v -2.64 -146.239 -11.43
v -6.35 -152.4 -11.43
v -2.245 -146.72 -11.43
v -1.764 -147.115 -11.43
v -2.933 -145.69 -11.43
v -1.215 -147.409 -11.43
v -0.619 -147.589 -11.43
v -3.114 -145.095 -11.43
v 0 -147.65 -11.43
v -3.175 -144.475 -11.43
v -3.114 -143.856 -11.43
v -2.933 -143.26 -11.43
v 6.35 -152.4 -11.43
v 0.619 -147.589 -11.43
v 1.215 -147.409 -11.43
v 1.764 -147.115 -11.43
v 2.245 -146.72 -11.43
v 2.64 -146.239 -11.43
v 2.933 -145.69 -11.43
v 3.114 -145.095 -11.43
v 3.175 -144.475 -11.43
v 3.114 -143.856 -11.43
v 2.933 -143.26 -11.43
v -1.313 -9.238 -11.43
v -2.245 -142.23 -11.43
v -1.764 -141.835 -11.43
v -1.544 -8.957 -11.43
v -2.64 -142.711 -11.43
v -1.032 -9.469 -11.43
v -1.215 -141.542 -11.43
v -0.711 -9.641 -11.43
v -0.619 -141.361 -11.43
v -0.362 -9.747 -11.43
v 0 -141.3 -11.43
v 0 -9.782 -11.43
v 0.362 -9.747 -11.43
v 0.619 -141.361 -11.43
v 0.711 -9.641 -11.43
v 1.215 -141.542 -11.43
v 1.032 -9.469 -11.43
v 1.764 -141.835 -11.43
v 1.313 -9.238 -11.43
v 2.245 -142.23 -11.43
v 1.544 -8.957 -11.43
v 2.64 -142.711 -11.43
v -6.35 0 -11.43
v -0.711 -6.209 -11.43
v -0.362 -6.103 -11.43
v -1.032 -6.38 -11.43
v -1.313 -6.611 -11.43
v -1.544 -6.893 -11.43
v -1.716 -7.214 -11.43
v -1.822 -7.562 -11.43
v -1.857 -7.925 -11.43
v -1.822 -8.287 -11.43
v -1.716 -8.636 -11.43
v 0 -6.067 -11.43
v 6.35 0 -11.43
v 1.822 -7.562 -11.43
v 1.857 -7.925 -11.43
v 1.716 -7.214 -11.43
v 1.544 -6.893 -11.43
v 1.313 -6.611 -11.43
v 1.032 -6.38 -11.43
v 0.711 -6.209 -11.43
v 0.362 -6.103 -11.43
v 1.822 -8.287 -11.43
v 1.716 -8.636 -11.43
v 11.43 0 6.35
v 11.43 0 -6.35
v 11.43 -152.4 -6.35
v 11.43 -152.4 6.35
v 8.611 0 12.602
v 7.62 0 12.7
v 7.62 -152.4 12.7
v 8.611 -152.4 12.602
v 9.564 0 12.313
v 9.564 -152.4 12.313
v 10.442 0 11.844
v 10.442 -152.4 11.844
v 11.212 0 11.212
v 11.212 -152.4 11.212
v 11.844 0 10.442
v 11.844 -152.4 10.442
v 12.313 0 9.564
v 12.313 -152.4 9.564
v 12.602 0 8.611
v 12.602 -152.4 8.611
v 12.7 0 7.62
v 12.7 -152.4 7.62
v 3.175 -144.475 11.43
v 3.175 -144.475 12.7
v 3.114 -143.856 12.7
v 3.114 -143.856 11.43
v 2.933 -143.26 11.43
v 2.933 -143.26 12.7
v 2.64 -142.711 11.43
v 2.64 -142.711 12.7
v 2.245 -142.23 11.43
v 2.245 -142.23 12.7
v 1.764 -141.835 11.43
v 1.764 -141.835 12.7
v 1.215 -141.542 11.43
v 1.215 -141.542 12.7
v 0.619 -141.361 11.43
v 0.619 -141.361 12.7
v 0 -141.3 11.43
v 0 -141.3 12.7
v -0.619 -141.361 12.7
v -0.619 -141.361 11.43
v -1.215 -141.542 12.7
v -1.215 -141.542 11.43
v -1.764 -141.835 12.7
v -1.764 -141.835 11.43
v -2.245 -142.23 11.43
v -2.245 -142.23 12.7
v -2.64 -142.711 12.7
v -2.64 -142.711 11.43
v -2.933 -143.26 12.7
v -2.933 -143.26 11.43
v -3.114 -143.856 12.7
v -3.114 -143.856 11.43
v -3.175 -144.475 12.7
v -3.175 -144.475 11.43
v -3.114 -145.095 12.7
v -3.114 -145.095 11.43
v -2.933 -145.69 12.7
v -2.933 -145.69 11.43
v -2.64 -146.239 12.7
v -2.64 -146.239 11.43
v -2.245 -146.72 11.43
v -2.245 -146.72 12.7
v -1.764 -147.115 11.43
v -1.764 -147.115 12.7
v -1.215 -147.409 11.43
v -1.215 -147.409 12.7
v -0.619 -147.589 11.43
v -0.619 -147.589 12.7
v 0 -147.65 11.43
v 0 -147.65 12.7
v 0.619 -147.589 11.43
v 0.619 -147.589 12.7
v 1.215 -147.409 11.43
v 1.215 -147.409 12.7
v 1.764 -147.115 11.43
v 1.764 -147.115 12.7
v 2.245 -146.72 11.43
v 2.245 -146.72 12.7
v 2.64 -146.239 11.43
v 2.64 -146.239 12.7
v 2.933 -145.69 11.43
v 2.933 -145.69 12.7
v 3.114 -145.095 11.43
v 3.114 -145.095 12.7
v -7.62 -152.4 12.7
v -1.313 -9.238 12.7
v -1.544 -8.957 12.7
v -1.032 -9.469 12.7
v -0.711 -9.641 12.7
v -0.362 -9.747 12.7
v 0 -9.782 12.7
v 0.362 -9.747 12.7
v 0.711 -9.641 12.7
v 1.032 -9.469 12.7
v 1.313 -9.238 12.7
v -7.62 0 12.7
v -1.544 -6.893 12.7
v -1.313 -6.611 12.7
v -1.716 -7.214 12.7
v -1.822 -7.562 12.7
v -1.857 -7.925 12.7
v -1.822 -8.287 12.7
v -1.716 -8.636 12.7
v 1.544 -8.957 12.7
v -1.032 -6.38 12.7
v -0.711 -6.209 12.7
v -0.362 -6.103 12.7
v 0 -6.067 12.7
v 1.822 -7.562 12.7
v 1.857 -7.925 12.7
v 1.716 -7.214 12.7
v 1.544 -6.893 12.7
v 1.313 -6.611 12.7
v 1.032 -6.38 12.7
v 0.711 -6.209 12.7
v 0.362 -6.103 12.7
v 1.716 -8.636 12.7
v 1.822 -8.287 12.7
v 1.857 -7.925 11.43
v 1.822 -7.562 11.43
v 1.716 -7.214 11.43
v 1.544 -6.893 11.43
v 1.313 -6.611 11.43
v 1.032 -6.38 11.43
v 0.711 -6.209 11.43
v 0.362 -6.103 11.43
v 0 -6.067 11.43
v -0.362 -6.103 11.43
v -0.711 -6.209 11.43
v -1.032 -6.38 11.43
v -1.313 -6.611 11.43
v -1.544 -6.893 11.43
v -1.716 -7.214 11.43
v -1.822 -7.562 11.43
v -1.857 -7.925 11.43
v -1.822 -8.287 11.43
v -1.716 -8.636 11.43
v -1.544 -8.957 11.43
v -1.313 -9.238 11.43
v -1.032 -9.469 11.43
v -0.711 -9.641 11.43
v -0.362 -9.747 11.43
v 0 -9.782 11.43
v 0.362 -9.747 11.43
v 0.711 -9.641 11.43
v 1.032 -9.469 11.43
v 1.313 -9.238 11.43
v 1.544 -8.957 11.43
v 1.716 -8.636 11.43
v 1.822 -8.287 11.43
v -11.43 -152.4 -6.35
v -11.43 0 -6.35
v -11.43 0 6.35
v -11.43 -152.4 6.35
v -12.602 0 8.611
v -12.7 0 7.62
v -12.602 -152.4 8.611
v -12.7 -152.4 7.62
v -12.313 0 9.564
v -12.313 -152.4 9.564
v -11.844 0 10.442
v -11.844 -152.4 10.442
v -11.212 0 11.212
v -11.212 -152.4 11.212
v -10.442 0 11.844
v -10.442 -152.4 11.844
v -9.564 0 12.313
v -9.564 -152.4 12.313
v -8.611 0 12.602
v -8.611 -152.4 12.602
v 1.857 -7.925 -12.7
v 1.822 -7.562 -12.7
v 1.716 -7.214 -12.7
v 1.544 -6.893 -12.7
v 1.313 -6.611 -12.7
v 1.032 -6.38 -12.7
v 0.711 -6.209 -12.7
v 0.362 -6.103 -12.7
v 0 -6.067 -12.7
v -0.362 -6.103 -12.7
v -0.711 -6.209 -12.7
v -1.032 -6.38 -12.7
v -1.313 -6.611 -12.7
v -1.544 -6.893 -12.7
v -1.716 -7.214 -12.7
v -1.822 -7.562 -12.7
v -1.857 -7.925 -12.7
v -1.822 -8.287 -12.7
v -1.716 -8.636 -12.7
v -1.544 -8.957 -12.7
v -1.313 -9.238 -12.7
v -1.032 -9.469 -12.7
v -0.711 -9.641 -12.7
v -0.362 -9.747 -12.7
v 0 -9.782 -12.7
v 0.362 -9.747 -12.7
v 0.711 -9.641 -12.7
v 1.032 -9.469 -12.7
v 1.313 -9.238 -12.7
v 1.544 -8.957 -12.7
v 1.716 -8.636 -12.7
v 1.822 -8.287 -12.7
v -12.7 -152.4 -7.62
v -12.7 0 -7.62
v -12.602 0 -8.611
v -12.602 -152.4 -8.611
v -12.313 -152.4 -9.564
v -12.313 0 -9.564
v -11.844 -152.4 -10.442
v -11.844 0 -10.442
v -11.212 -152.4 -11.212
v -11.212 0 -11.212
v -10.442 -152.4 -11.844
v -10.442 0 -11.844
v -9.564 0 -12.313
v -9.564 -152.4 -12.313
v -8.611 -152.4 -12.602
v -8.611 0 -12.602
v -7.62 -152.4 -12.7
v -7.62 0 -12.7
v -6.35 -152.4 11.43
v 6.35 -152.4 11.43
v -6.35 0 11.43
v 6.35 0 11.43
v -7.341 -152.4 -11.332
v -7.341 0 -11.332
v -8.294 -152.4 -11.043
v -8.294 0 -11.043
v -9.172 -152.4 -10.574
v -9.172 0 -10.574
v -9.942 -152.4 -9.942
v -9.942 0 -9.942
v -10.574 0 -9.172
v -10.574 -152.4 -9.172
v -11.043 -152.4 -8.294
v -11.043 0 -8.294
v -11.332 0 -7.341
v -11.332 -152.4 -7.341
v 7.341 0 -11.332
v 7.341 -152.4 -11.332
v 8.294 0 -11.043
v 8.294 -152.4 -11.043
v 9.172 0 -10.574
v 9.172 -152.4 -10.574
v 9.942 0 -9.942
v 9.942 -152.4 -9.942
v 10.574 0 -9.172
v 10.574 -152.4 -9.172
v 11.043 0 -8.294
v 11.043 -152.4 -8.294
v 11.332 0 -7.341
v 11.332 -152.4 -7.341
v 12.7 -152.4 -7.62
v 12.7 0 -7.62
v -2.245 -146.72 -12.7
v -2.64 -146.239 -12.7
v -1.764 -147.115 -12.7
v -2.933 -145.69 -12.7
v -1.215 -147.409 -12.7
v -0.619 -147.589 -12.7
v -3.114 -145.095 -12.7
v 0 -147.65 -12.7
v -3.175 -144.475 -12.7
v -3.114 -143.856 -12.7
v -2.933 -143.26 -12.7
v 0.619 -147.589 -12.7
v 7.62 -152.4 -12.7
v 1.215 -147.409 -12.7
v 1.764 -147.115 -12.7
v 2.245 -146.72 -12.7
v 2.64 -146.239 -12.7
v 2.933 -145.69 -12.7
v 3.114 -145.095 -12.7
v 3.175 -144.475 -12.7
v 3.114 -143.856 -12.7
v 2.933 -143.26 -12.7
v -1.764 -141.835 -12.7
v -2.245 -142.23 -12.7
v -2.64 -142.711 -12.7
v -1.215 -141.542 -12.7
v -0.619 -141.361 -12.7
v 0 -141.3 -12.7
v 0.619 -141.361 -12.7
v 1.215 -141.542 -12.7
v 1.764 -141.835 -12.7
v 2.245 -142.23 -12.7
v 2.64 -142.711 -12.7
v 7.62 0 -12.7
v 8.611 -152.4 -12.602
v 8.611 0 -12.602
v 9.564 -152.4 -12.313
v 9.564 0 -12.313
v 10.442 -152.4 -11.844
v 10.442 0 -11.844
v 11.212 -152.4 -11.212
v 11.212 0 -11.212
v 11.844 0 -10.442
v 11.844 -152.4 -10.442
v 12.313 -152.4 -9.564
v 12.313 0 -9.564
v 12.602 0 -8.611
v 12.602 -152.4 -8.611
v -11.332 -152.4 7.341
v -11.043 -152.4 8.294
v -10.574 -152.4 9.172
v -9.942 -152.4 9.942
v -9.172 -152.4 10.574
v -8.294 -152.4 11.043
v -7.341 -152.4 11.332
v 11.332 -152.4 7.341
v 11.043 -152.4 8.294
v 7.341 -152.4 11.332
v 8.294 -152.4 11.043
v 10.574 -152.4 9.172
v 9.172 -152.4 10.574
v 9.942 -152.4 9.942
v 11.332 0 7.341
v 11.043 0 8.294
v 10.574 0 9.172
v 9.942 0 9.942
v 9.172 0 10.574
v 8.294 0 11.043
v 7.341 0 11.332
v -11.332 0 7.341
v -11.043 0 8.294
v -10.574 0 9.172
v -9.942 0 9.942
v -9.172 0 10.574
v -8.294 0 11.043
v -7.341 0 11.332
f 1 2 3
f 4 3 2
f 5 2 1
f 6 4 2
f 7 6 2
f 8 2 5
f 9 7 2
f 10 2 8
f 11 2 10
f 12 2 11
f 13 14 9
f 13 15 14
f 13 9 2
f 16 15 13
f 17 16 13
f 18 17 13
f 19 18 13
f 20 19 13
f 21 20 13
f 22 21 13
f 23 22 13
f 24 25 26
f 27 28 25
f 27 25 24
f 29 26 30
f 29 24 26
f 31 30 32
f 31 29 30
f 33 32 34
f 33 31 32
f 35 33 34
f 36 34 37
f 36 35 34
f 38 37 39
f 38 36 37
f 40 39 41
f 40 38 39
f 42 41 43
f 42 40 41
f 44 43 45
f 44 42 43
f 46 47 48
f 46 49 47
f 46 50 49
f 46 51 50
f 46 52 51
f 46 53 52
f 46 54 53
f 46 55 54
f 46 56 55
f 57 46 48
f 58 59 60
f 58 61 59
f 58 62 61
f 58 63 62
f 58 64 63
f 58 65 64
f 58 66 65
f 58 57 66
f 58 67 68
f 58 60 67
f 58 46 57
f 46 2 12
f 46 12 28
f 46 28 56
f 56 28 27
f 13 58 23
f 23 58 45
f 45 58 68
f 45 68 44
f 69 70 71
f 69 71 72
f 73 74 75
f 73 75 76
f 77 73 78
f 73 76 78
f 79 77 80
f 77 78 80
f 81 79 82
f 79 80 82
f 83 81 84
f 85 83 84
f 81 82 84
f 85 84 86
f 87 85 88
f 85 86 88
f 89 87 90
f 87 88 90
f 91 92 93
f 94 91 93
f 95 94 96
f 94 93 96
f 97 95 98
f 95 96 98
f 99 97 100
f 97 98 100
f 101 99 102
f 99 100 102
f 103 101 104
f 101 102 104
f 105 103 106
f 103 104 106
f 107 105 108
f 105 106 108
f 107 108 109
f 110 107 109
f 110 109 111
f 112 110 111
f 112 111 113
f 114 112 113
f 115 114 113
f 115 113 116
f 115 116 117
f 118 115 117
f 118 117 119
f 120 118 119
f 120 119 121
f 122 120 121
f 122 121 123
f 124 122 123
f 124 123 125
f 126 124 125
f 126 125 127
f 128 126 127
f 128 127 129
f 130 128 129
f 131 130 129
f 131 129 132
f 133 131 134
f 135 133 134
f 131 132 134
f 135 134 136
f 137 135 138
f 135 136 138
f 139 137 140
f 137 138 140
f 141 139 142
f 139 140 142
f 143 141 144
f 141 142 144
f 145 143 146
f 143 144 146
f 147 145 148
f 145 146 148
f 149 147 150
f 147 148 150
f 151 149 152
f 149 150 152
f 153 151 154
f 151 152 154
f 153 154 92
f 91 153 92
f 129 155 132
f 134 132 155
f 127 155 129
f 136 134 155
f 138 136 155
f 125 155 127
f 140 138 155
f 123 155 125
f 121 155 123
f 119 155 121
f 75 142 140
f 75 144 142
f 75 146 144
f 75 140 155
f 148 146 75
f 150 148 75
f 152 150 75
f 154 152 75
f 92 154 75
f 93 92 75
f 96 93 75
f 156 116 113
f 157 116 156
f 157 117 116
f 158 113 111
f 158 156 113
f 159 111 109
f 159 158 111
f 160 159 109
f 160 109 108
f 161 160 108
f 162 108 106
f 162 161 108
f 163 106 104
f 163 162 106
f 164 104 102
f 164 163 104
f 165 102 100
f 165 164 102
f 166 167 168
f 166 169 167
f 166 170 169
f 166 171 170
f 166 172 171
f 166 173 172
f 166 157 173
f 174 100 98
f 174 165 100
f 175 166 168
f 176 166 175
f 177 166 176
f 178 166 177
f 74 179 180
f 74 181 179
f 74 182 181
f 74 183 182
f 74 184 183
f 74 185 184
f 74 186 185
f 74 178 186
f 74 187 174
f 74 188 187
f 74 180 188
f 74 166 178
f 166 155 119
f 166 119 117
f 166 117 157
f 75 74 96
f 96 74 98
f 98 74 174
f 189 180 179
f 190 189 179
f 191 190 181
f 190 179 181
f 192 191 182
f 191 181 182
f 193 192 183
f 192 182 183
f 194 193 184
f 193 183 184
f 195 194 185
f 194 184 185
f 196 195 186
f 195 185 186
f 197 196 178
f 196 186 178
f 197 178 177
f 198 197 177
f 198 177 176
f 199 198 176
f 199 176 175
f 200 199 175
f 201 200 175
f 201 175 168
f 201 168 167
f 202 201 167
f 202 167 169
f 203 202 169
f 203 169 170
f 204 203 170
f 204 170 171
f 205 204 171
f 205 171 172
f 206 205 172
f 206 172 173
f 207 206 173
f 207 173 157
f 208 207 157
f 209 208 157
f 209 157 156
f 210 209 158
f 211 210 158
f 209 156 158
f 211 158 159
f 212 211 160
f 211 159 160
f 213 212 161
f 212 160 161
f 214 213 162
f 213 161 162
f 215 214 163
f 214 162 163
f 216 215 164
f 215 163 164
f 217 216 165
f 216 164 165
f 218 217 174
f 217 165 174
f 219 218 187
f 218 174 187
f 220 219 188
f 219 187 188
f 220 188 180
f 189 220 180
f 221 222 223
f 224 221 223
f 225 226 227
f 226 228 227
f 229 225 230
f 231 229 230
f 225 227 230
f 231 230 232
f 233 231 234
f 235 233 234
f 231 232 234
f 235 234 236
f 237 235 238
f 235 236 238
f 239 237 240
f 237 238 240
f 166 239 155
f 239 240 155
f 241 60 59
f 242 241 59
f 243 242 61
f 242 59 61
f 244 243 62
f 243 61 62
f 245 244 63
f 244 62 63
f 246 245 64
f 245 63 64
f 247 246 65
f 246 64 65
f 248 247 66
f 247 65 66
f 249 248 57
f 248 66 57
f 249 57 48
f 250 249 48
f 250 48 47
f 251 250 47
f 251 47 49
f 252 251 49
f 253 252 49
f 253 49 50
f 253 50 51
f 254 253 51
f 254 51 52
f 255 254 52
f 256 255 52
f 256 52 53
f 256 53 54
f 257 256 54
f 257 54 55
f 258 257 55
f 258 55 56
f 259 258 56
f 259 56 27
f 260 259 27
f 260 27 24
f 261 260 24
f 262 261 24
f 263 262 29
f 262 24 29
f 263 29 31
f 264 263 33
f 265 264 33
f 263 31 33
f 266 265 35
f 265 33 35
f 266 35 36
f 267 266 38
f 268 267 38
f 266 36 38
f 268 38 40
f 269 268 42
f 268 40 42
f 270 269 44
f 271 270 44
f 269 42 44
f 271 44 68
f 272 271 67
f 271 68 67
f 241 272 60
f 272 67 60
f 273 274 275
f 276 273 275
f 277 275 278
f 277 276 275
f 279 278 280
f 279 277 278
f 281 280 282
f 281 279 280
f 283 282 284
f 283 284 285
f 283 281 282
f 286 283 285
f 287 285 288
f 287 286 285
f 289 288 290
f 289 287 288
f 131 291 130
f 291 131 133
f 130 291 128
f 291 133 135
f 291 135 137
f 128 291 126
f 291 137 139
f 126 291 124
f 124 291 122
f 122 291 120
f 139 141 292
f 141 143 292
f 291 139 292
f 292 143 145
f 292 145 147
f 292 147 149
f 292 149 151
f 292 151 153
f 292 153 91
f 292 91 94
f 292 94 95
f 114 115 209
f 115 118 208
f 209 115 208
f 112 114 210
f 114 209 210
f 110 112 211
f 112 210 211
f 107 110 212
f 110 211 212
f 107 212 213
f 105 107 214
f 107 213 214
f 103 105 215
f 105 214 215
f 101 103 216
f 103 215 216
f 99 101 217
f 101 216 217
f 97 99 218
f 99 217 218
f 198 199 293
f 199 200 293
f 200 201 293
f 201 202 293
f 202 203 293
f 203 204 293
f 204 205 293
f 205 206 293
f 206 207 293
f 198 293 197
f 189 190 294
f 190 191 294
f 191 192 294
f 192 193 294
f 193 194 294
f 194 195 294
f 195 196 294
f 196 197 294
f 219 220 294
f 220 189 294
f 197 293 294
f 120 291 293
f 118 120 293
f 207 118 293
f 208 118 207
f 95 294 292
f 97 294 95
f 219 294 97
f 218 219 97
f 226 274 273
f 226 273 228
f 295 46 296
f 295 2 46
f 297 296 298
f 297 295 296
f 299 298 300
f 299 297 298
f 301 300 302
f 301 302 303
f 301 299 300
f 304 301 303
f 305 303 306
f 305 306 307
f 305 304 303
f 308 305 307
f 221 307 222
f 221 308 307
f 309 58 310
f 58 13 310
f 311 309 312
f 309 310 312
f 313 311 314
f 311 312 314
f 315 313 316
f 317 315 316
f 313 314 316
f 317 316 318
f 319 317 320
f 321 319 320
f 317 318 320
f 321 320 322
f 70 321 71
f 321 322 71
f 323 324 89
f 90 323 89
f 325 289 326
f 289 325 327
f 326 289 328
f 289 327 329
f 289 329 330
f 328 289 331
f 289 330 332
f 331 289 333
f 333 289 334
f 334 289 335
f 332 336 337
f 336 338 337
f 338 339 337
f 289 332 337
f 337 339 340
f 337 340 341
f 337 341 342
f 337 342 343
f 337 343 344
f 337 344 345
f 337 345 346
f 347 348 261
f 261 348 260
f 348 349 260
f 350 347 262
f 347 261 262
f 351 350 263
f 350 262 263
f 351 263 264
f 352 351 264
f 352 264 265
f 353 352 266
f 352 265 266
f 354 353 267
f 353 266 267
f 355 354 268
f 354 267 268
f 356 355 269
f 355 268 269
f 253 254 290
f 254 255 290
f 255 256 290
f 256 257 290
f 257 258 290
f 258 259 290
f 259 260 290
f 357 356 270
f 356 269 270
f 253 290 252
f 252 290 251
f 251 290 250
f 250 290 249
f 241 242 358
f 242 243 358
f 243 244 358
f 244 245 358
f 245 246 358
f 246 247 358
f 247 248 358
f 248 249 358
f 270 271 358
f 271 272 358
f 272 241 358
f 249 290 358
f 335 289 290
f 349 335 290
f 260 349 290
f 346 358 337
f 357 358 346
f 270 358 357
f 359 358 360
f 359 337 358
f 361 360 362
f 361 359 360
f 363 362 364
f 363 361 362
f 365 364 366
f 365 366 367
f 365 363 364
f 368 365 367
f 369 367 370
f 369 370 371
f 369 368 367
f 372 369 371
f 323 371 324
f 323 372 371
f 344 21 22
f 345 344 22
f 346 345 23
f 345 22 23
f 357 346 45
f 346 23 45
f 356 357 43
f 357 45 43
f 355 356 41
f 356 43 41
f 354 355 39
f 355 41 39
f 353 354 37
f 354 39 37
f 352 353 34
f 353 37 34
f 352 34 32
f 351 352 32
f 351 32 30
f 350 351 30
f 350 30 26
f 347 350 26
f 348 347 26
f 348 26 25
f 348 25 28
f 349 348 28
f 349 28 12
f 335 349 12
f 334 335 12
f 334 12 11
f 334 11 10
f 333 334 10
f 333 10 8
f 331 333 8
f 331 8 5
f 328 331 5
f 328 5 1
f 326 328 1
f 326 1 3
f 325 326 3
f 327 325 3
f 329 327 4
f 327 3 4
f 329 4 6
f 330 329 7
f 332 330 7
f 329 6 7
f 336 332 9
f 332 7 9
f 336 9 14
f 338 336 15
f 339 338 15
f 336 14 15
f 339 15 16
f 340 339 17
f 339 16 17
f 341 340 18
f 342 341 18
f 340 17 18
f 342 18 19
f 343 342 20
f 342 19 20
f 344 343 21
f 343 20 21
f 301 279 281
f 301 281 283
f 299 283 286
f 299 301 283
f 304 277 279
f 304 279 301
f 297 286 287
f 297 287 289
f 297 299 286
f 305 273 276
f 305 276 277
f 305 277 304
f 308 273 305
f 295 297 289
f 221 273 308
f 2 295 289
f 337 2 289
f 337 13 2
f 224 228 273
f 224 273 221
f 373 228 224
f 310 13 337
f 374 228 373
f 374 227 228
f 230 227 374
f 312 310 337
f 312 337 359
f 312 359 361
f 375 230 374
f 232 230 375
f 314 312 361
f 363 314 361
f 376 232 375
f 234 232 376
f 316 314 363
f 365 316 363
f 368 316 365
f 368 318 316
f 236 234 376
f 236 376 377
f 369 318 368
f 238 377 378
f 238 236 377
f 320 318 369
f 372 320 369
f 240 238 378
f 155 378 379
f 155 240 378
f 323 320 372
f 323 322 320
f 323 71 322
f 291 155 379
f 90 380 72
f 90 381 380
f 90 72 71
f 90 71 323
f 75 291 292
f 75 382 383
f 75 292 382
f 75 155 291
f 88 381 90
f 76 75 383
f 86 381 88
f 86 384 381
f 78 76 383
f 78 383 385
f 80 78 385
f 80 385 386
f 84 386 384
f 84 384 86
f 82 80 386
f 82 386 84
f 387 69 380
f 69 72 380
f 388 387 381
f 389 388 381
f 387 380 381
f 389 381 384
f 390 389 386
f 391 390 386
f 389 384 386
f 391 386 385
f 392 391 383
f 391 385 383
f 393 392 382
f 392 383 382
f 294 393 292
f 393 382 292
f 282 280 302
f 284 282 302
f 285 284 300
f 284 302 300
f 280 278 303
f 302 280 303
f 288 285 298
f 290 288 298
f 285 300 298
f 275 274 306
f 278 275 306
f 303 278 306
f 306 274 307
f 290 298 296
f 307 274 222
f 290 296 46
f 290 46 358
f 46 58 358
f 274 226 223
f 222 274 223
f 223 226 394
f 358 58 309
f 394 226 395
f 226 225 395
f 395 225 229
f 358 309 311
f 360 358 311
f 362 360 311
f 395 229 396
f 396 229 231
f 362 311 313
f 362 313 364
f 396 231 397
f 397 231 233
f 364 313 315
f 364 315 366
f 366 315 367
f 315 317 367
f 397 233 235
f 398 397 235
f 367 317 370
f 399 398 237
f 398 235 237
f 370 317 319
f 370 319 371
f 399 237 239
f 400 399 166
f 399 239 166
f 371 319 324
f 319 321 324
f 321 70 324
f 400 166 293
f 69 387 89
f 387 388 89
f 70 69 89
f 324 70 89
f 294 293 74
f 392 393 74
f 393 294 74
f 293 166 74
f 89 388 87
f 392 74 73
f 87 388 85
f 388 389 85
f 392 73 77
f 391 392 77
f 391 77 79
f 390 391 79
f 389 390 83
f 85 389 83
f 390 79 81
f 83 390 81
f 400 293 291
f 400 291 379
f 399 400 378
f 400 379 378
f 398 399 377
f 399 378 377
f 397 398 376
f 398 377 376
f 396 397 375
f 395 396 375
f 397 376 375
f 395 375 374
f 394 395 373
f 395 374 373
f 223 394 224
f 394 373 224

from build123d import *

# Parameters (mm, degrees)
F0_W     = 25.4
F0_H     = 25.4
F0_W_2   = 22.86
F0_H_2   = 22.86
F1_DEPTH = 152.4
F2_R     = 5.08
F3_R     = 1.857445
F4_DEPTH = 25.401
F6_R     = 3.175
F7_DEPTH = 25.401


with BuildPart() as f1:
    # F0 (on Front) → F1 (new body)
    with BuildSketch(Plane.XZ):
        Rectangle(F0_W, F0_H)
        Rectangle(F0_W_2, F0_H_2, mode=Mode.SUBTRACT)
    extrude(amount=F1_DEPTH)

    # F2
    f2_edges = [f1.edges().sort_by_distance(p)[0] for p in [
        (12.7, -76.2, 12.7),
        (-12.7, -76.2, 12.7),
        (12.7, -76.2, -12.7),
        (-12.7, -76.2, -12.7),
        (11.43, -76.2, 11.43),
        (-11.43, -76.2, 11.43),
        (11.43, -76.2, -11.43),
        (-11.43, -76.2, -11.43),
    ]]
    fillet(f2_edges, radius=F2_R)

    # F3 (on face) → F4 (cut, through all)
    with BuildSketch(Plane.XY.offset(12.7)):
        with Locations((0, -7.9248)):
            Circle(F3_R)
    extrude(amount=-F4_DEPTH, mode=Mode.SUBTRACT)

    # F6 (on face) → F7 (cut, through all)
    with BuildSketch(Plane.XY.offset(12.7)):
        with Locations((0, -144.4752)):
            Circle(F6_R)
    extrude(amount=-F7_DEPTH, mode=Mode.SUBTRACT)


solid = f1.part
